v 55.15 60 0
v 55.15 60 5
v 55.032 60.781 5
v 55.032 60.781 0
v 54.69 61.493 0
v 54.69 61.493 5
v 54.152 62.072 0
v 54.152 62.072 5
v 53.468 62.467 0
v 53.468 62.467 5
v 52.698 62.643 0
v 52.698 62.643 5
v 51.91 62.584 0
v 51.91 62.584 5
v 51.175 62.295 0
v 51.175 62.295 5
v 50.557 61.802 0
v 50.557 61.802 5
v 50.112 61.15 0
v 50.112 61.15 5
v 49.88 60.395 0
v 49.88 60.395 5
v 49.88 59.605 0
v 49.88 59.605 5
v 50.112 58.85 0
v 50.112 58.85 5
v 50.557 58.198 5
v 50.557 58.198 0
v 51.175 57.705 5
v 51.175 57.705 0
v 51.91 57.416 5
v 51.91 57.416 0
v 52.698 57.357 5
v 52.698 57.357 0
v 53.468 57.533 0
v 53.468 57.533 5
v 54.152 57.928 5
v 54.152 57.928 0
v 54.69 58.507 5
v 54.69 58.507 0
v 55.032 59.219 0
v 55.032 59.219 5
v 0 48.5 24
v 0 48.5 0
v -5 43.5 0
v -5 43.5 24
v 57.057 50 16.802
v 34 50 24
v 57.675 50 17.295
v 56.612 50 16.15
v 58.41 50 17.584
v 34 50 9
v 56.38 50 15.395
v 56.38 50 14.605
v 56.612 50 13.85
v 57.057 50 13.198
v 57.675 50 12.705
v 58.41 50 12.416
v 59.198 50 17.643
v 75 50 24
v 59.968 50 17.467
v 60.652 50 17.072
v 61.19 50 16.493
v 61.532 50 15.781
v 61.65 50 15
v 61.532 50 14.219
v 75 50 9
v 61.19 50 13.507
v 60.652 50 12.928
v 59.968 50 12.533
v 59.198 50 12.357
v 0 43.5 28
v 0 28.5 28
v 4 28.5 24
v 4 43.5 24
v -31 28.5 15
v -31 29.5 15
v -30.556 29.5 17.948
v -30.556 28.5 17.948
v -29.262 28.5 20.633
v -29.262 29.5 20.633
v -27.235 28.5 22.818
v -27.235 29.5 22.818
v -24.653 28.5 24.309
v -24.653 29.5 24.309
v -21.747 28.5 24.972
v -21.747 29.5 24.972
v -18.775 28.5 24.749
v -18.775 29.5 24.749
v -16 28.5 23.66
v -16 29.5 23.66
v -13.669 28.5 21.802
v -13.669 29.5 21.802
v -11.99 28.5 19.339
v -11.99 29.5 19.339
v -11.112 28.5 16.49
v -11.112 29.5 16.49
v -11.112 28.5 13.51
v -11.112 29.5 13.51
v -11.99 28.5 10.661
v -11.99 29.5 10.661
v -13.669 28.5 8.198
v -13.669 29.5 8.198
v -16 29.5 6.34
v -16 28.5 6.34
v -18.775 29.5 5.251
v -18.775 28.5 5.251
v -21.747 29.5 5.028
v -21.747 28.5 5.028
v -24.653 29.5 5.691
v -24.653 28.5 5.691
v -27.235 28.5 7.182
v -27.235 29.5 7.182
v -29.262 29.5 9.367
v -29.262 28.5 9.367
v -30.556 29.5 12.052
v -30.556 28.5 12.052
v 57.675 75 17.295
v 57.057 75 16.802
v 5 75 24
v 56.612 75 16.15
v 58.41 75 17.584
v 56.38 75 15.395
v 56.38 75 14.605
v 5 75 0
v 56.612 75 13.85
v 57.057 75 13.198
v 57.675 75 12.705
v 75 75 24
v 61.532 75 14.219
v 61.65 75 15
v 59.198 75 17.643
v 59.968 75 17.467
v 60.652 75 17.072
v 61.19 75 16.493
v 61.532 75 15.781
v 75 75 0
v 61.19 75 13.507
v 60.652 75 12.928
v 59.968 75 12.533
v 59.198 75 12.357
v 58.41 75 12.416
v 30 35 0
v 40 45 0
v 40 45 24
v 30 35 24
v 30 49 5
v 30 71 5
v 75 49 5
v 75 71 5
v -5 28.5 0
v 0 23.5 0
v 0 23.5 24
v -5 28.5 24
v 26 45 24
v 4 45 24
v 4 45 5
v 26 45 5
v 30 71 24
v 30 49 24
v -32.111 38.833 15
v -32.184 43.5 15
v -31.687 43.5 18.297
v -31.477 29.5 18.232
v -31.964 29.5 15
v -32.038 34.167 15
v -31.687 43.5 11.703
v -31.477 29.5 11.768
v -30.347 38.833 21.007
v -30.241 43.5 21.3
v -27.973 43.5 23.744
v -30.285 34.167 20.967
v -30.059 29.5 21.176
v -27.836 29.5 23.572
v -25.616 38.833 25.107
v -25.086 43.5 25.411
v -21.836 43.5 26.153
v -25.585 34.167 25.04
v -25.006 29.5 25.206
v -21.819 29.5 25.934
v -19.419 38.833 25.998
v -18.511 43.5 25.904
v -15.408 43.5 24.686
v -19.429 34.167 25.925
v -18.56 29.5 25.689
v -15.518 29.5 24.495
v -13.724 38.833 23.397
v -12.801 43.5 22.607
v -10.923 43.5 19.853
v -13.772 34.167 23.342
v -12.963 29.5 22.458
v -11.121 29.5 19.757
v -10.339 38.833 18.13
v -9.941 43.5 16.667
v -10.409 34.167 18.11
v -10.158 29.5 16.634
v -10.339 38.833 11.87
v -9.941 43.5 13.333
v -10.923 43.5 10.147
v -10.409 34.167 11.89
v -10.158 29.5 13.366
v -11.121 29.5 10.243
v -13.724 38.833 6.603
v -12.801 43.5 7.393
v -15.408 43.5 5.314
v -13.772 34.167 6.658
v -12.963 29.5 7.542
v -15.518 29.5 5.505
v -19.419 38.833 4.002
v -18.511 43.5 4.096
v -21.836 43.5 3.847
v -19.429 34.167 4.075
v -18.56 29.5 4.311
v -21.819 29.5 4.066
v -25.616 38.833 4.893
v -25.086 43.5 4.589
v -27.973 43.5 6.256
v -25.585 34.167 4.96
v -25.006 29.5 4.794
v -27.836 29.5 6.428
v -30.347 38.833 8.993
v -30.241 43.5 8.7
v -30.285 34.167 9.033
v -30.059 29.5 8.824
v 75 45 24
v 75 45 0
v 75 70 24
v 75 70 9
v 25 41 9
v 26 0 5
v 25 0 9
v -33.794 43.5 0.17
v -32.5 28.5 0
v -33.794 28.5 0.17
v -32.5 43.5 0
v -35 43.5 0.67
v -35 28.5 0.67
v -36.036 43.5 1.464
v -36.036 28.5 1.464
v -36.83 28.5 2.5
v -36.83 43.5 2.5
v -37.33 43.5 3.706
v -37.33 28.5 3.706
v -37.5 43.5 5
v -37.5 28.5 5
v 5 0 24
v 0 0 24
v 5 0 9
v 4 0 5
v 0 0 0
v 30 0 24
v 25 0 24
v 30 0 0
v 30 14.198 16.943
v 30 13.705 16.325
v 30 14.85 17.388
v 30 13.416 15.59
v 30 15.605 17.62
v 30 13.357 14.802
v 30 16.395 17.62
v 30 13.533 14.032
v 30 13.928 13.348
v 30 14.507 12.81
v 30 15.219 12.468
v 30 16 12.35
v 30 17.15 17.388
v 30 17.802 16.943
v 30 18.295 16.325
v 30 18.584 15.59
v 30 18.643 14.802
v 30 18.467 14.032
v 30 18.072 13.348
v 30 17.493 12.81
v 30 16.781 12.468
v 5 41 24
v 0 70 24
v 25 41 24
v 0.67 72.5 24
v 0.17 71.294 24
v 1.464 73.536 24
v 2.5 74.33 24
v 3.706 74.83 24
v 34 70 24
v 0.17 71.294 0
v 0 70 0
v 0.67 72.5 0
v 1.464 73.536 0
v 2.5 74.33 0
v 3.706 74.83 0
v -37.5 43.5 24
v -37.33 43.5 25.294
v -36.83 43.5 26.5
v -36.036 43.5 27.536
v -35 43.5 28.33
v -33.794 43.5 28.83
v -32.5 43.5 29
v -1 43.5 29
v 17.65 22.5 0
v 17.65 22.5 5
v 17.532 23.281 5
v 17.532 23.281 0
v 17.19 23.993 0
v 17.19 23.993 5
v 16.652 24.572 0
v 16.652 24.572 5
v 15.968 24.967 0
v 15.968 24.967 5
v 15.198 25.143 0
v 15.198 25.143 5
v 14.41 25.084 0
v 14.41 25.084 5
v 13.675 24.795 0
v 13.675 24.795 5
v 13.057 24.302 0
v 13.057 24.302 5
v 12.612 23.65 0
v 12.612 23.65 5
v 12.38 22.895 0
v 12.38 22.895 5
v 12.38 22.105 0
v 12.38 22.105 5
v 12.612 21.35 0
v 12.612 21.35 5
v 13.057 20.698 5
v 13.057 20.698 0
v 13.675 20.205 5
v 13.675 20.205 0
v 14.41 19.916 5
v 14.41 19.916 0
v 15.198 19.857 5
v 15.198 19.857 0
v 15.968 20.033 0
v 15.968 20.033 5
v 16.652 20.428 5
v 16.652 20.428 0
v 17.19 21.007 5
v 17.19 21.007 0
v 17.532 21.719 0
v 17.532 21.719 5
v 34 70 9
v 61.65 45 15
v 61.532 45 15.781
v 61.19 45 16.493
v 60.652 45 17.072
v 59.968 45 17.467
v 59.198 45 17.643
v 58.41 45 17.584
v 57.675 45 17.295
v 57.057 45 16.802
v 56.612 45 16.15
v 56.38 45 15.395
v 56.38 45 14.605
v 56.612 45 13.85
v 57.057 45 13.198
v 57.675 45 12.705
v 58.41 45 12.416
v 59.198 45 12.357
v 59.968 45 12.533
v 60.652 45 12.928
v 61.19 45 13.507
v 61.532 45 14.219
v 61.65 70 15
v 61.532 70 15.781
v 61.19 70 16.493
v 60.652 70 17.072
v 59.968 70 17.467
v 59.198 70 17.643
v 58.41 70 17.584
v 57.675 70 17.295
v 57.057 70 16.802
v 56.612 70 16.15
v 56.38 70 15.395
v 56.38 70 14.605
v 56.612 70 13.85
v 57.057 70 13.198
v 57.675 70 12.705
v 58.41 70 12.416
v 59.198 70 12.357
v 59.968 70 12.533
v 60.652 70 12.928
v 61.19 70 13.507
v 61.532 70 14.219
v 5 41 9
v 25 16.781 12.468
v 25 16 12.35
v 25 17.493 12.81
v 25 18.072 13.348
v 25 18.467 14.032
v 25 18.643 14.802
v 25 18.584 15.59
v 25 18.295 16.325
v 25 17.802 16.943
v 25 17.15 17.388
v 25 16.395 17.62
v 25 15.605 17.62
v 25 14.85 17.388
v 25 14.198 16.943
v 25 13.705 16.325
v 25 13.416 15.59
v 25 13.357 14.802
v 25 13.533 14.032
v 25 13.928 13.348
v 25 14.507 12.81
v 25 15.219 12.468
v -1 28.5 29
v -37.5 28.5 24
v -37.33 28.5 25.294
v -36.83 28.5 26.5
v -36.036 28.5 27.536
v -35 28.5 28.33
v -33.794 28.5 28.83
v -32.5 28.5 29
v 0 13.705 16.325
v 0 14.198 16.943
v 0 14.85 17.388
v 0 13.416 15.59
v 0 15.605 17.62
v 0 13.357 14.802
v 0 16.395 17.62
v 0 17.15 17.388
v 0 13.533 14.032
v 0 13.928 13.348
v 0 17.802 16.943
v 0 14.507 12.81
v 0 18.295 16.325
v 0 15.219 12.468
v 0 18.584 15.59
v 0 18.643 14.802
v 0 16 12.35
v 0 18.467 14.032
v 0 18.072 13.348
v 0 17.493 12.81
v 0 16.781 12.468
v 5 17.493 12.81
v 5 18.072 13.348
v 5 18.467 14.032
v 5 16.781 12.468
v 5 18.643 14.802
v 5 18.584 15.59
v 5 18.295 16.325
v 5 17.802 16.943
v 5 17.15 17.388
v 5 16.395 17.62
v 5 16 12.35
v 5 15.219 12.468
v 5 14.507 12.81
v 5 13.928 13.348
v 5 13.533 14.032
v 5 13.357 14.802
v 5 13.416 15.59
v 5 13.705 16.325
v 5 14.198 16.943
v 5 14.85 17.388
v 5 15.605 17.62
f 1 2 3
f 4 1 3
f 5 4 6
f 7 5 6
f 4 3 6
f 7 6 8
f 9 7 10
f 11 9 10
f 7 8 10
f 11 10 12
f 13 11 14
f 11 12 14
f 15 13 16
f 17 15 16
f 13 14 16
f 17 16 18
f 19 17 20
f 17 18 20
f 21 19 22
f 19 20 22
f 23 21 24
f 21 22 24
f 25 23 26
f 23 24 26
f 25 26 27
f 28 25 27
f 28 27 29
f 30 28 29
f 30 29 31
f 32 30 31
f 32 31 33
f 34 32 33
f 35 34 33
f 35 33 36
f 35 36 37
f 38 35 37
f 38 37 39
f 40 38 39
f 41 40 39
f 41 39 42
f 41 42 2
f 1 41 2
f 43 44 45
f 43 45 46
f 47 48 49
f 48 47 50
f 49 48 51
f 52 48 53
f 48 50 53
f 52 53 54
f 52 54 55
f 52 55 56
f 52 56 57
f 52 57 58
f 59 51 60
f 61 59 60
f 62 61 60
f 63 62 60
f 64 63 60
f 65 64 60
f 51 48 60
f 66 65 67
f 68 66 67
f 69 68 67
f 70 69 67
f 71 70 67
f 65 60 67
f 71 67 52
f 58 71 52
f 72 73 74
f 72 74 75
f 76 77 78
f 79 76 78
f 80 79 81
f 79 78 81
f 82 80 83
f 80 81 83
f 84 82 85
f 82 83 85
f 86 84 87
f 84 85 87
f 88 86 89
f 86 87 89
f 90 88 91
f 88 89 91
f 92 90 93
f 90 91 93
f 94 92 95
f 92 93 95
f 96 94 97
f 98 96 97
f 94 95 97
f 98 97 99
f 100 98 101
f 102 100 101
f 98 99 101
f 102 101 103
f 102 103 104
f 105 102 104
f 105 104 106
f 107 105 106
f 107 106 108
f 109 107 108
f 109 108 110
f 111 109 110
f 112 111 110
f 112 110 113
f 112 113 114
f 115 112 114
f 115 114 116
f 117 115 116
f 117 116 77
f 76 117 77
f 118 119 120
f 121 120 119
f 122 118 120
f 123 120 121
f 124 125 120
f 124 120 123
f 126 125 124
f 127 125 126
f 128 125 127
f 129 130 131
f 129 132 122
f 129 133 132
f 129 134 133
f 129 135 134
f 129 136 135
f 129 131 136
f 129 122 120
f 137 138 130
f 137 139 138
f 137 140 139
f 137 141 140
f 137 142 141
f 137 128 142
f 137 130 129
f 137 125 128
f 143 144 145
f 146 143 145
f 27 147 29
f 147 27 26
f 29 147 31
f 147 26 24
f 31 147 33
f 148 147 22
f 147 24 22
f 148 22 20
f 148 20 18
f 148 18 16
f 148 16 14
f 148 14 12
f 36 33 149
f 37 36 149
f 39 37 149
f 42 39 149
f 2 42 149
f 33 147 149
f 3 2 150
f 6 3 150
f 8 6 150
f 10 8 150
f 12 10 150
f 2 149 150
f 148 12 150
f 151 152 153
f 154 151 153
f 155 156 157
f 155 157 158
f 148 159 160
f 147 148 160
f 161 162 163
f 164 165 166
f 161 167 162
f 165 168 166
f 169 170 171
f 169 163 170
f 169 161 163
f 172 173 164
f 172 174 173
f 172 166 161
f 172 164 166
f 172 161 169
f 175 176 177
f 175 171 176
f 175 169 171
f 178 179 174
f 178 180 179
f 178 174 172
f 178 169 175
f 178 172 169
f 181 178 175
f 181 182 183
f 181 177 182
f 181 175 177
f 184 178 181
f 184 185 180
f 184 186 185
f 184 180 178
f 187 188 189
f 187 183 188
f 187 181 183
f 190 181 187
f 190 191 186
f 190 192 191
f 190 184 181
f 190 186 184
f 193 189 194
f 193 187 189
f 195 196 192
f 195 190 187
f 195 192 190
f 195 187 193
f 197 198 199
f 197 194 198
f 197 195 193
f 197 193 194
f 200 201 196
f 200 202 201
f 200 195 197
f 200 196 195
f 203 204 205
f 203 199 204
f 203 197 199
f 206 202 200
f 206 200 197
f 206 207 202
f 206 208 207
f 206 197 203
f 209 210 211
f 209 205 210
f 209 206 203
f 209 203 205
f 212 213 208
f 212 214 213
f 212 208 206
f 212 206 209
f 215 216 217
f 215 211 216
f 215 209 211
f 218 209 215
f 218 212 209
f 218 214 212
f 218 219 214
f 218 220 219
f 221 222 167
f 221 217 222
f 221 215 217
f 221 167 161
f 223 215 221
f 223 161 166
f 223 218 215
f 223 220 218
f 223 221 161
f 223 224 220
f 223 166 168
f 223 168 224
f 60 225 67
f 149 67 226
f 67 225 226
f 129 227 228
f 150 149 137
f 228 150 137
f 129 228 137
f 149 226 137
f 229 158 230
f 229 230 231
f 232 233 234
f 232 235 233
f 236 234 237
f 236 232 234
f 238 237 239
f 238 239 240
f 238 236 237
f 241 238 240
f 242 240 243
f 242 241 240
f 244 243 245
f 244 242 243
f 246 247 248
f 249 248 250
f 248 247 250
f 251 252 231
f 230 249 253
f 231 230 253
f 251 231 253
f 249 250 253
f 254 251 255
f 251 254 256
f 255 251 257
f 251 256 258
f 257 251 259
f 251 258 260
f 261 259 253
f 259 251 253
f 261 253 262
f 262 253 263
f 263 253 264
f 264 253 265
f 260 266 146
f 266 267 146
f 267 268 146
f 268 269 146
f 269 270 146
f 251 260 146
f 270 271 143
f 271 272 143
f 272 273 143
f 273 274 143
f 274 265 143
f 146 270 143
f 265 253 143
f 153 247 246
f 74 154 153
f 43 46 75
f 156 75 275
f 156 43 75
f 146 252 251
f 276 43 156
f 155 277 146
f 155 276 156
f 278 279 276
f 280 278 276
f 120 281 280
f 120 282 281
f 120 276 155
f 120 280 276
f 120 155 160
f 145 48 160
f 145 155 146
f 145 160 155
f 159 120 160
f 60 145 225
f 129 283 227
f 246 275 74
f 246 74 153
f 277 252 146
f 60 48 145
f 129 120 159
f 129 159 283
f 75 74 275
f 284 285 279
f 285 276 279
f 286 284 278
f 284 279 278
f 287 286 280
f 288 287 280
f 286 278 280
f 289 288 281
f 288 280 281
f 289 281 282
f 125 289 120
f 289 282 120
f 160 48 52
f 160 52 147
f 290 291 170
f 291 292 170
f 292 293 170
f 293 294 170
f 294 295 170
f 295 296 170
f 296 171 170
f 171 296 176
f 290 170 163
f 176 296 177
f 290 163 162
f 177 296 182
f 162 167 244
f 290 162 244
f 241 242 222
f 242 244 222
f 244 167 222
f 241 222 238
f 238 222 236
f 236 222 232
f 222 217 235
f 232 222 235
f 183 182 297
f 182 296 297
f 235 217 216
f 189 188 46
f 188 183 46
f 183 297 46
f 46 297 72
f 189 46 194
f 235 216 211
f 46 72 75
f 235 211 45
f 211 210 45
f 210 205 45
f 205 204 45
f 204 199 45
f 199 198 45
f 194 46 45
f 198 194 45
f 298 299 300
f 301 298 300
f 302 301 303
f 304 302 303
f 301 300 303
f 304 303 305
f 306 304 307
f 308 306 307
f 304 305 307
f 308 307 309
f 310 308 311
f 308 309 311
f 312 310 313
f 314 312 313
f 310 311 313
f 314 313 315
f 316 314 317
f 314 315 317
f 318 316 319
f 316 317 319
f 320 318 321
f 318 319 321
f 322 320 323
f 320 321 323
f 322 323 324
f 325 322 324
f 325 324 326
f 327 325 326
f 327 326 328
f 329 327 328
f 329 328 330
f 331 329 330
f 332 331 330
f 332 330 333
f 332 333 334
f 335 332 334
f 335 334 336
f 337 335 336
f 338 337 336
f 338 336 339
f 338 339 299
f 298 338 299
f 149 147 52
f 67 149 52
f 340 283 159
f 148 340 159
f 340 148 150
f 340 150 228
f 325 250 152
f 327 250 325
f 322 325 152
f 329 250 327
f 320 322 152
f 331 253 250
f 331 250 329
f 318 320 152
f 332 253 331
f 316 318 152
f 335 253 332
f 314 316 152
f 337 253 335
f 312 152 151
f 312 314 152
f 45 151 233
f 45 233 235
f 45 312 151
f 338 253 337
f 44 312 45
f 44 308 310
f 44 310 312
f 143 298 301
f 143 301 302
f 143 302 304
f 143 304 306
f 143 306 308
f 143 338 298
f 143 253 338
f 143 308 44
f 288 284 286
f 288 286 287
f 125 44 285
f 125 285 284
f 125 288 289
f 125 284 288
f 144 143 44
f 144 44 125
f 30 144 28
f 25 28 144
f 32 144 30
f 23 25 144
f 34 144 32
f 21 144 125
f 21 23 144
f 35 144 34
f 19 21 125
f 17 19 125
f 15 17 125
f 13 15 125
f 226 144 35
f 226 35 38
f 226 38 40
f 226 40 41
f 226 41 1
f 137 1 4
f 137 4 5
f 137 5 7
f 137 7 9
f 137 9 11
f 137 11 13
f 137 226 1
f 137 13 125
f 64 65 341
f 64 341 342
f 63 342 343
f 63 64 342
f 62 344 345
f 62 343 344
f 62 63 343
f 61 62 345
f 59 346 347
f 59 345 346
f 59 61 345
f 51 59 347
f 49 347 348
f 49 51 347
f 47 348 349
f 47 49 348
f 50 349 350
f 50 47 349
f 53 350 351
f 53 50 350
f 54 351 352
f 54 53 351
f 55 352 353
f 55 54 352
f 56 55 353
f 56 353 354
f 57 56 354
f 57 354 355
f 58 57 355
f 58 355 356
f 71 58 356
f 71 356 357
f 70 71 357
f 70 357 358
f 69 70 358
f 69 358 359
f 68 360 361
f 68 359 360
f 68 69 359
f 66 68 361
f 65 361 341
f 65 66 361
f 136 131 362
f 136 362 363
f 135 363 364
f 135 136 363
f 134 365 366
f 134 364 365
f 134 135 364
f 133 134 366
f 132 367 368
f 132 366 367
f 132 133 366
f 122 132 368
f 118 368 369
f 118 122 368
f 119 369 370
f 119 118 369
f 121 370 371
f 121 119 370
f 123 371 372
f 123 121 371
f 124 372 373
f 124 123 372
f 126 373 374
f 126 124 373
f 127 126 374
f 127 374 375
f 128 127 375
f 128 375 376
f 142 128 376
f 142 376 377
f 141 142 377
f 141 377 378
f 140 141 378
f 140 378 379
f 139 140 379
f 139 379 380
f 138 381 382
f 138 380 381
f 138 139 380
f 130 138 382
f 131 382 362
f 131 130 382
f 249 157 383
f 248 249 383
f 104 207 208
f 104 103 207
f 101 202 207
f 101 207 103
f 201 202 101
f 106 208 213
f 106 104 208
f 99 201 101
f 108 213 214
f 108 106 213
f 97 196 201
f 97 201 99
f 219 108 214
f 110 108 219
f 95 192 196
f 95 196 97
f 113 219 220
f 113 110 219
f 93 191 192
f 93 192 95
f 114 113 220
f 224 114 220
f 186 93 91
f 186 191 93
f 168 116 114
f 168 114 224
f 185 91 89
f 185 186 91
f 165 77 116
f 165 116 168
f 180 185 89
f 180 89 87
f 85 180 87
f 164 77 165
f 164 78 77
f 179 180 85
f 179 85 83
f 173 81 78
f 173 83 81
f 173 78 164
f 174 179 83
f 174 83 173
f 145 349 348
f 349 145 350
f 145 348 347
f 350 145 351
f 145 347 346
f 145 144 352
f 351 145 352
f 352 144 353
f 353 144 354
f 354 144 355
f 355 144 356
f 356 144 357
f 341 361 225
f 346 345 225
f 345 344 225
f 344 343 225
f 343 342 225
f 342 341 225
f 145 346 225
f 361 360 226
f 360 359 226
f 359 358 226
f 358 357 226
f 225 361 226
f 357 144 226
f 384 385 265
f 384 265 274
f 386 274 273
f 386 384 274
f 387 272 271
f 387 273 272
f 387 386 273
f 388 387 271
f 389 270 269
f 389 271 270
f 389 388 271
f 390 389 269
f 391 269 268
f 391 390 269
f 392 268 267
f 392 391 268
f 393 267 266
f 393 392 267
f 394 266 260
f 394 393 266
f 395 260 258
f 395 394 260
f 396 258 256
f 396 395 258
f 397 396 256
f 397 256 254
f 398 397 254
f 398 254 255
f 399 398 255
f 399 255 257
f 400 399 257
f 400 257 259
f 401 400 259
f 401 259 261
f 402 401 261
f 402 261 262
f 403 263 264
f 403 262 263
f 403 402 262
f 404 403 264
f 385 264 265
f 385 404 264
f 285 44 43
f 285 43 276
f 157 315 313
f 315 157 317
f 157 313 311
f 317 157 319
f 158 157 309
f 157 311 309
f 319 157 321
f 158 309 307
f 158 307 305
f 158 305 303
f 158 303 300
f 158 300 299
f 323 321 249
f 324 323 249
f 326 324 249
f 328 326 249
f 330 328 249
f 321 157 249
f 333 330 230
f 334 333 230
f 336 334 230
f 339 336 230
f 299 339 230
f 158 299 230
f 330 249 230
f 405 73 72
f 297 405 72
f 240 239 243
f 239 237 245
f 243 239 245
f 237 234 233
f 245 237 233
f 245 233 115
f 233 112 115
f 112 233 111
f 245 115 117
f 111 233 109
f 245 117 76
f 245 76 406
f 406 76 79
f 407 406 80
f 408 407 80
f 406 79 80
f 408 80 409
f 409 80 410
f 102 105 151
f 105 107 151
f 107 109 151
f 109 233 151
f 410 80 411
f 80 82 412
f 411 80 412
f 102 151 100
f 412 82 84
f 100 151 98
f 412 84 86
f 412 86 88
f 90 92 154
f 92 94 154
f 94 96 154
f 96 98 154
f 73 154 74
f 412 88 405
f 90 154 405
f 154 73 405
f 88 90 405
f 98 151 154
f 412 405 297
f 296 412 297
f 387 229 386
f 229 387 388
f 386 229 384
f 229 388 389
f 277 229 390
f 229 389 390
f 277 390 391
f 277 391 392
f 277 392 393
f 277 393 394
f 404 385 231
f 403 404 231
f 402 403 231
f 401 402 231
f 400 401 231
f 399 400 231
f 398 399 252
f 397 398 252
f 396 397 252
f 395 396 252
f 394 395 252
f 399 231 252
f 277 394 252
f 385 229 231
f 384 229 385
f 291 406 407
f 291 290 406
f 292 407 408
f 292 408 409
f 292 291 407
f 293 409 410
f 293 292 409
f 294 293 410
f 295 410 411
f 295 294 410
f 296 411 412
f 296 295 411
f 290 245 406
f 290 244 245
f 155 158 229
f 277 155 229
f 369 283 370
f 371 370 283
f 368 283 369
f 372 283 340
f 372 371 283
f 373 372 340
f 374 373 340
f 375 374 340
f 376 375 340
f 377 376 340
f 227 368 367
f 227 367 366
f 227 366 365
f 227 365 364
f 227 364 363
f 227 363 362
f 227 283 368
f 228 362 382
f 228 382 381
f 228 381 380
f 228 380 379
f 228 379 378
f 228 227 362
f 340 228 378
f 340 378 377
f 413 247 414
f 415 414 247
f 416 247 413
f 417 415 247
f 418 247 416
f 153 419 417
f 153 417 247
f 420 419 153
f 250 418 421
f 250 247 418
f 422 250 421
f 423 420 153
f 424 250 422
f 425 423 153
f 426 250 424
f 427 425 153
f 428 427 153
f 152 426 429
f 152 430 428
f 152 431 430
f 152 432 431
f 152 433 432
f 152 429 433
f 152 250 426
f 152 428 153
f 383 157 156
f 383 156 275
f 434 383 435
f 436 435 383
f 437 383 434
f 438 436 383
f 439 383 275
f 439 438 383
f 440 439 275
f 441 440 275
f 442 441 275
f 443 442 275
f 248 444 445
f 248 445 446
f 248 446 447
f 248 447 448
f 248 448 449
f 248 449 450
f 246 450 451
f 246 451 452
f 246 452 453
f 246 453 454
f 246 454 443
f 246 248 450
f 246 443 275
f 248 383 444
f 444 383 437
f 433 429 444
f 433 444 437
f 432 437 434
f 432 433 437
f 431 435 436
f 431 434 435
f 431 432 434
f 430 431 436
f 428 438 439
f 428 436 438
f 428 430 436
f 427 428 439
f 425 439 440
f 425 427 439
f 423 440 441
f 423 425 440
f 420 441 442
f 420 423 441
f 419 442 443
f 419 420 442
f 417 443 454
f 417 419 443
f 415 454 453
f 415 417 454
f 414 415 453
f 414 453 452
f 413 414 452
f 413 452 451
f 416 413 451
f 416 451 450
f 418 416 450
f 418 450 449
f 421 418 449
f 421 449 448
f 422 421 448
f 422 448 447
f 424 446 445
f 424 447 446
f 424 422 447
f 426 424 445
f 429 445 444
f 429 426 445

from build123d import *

# Parameters (mm, degrees)
SKETCH1_W               = 75
SKETCH1_H               = 75
BOSS_EXTRUDE1_DEPTH     = 24
SKETCH2_W               = 20
SKETCH2_H               = 19
CUT_EXTRUDE1_DEPTH      = 45
SKETCH3_W               = 19
SKETCH3_H               = 20
CUT_EXTRUDE2_DEPTH      = 45
CUT_EXTRUDE3_DEPTH      = 109.747413762
CUT_EXTRUDE3_DEPTH_BACK = 109.747413762
SKETCH4_W               = 45
SKETCH4_H               = 45
FILLET1_R               = 5
CHAMFER1_SIZE           = 10
SKETCH5_W               = 29
SKETCH5_H               = 15
BOSS_EXTRUDE2_DEPTH     = 37.5
SKETCH6_R               = 11.2
CUT_EXTRUDE4_DEPTH      = 14
FILLET2_R               = 5
CHAMFER3_SIZE           = 5
CUT_EXTRUDE5_DEPTH      = 93.146622293
CUT_EXTRUDE5_DEPTH_BACK = 93.146622293
SKETCH7_R               = 2.65
CUT_EXTRUDE6_DEPTH      = 105.986903945
CUT_EXTRUDE6_DEPTH_BACK = 105.986903945
SKETCH8_R               = 2.65
SKETCH9_R               = 2.65
CUT_EXTRUDE7_DEPTH      = 10
SKETCH10_R              = 2.65
CUT_EXTRUDE8_DEPTH      = 10
CUT_EXTRUDE12_DEPTH     = 19
CUT_EXTRUDE13_REACH     = 111.959
CUT_EXTRUDE14_REACH     = 140.283
SKETCH14_R              = 10
CUT_EXTRUDE15_DEPTH     = 10
CHAMFER5_SIZE           = 4
CHAMFER6_SIZE           = 1
CHAMFER8_SIZE           = 15
CHAMFER8_SIZE_2         = 0.23563883


# Some blends are built 0.0001 mm under size
with BuildPart() as part:
    # Sketch1 → Boss-Extrude1 (new body)
    with BuildSketch(Plane.XY):
        with Locations((37.5, 37.5)):
            Rectangle(SKETCH1_W, SKETCH1_H)
    extrude(amount=BOSS_EXTRUDE1_DEPTH)

    # Sketch2 → Cut-Extrude1 (cut)
    with BuildSketch(Plane.XZ):
        with Locations((15, 14.5)):
            Rectangle(SKETCH2_W, SKETCH2_H)
    extrude(amount=-CUT_EXTRUDE1_DEPTH, mode=Mode.SUBTRACT)

    # Sketch3 → Cut-Extrude2 (cut)
    with BuildSketch(Plane(origin=(75, 0, 0), x_dir=(0, 0, -1), z_dir=(1, 0, 0))):
        with Locations((-14.5, 60)):
            Rectangle(SKETCH3_W, SKETCH3_H)
    extrude(amount=-CUT_EXTRUDE2_DEPTH, mode=Mode.SUBTRACT)

    # Sketch4 → Cut-Extrude3 (cut, two sides: drawn at the far end of the back side and taken through both)
    with BuildSketch(Plane.XY.offset(24).offset(-CUT_EXTRUDE3_DEPTH_BACK)):
        with Locations((52.5, 22.5)):
            Rectangle(SKETCH4_W, SKETCH4_H)
    extrude(amount=CUT_EXTRUDE3_DEPTH + CUT_EXTRUDE3_DEPTH_BACK, mode=Mode.SUBTRACT)

    # Fillet1
    fillet1_edges = [part.edges().sort_by_distance(p)[0] for p in [
        (0, 75, 12),
    ]]
    fillet(fillet1_edges, radius=FILLET1_R)

    # Chamfer1
    chamfer1_edges = [part.edges().sort_by_distance(p)[0] for p in [
        (30, 45, 12),
    ]]
    chamfer(chamfer1_edges, length=CHAMFER1_SIZE)

    # Sketch5 → Boss-Extrude2 (add)
    with BuildSketch(Plane.ZY):
        with Locations((14.5, 36)):
            Rectangle(SKETCH5_W, SKETCH5_H)
    extrude(amount=BOSS_EXTRUDE2_DEPTH)

    # Sketch6 → Cut-Extrude4 (cut)
    with BuildSketch(Plane(origin=(0, 43.5, 0), x_dir=(1, 0, 0), z_dir=(0, 1, 0))):
        with Locations(Location((-21, -15.000000001, 0), (0, 0, 180))):
            Circle(SKETCH6_R)
    extrude(amount=-CUT_EXTRUDE4_DEPTH, mode=Mode.SUBTRACT)

    # Fillet2
    fillet2_edges = [part.edges().sort_by_distance(p)[0] for p in [
        (-37.5, 36, 29),
        (-37.5, 36, 0),
    ]]
    fillet(fillet2_edges, radius=FILLET2_R)

    # Chamfer3
    chamfer3_edges = [part.edges().sort_by_distance(p)[0] for p in [
        (0, 43.5, 12),
        (0, 28.5, 12),
    ]]
    chamfer(chamfer3_edges, length=CHAMFER3_SIZE)

    # Sketch7 → Cut-Extrude5 (cut, two sides: drawn at the far end of the back side and taken through both)
    with BuildSketch(Plane.XZ.offset(-45).offset(-CUT_EXTRUDE5_DEPTH_BACK)):
        with Locations((59, 15)):
            Circle(SKETCH7_R)
    extrude(amount=CUT_EXTRUDE5_DEPTH + CUT_EXTRUDE5_DEPTH_BACK, mode=Mode.SUBTRACT)

    # Sketch8 → Cut-Extrude6 (cut, two sides: drawn at the far end of the back side and taken through both)
    with BuildSketch(Plane(origin=(30, 0, 0), x_dir=(0, 0, -1), z_dir=(1, 0, 0)).offset(-CUT_EXTRUDE6_DEPTH_BACK)):
        with Locations((-15, 16)):
            Circle(SKETCH8_R)
    extrude(amount=CUT_EXTRUDE6_DEPTH + CUT_EXTRUDE6_DEPTH_BACK, mode=Mode.SUBTRACT)

    # Sketch9 → Cut-Extrude7 (cut)
    with BuildSketch(Plane.XY.offset(5)):
        with Locations((15, 22.5)):
            Circle(SKETCH9_R)
    extrude(amount=-CUT_EXTRUDE7_DEPTH, mode=Mode.SUBTRACT)

    # Sketch10 → Cut-Extrude8 (cut)
    with BuildSketch(Plane.XY.offset(5)):
        with Locations((52.5, 60)):
            Circle(SKETCH10_R)
    extrude(amount=-CUT_EXTRUDE8_DEPTH, mode=Mode.SUBTRACT)

    # Sketch11 → Cut-Extrude12 (cut)
    with BuildSketch(Plane.XY.offset(24)):
        Polygon((34, 70), (30, 71), (30, 70), align=None)
        Polygon((30, 50), (34, 50), (30, 49), align=None)
        Polygon((26, 45), (25, 41), (25, 45), align=None)
        Polygon((5, 45), (4, 45), (5, 41), align=None)
    extrude(amount=-CUT_EXTRUDE12_DEPTH, mode=Mode.SUBTRACT)

    # Cut-Extrude13: up to this face of the body (flat: up to its plane)
    cut_extrude13_end = Plane(part.part.faces().sort_by_distance((15, 45, 14.5))[0])
    # Sketch12 → Cut-Extrude13 (cut, up to the picked face)
    with BuildSketch(Plane.XZ, mode=Mode.PRIVATE) as cut_extrude13_sk1:
        Polygon((5, 5), (4, 5), (5, 9), align=None)
    cut_extrude13_tool1 = split(extrude(cut_extrude13_sk1.sketch, amount=-CUT_EXTRUDE13_REACH, mode=Mode.PRIVATE), bisect_by=cut_extrude13_end, keep=Keep.BOTH, mode=Mode.PRIVATE)
    # Sketch12 → Cut-Extrude13 (cut, up to the picked face)
    with BuildSketch(Plane.XZ, mode=Mode.PRIVATE) as cut_extrude13_sk2:
        Polygon((25, 5), (26, 5), (25, 9), align=None)
    cut_extrude13_tool2 = split(extrude(cut_extrude13_sk2.sketch, amount=-CUT_EXTRUDE13_REACH, mode=Mode.PRIVATE), bisect_by=cut_extrude13_end, keep=Keep.BOTH, mode=Mode.PRIVATE)
    add(cut_extrude13_tool1.solids().sort_by(Axis((4.666667, 0, 6.333333), (0, 1, 0)))[0], mode=Mode.SUBTRACT)
    add(cut_extrude13_tool2.solids().sort_by(Axis((25.333333, 0, 6.333333), (0, 1, 0)))[0], mode=Mode.SUBTRACT)

    # Cut-Extrude14: up to this face of the body (flat: up to its plane)
    cut_extrude14_end = Plane(part.part.faces().sort_by_distance((30, 60, 14.5))[0])
    # Sketch13 → Cut-Extrude14 (cut, up to the picked face)
    with BuildSketch(Plane(origin=(75, 0, 0), x_dir=(0, 0, -1), z_dir=(1, 0, 0)), mode=Mode.PRIVATE) as cut_extrude14_sk1:
        Polygon((-5, 50), (-5, 49), (-9, 50), align=None)
    cut_extrude14_tool1 = split(extrude(cut_extrude14_sk1.sketch, amount=-CUT_EXTRUDE14_REACH, mode=Mode.PRIVATE), bisect_by=cut_extrude14_end, keep=Keep.BOTH, mode=Mode.PRIVATE)
    # Sketch13 → Cut-Extrude14 (cut, up to the picked face)
    with BuildSketch(Plane(origin=(75, 0, 0), x_dir=(0, 0, -1), z_dir=(1, 0, 0)), mode=Mode.PRIVATE) as cut_extrude14_sk2:
        Polygon((-5, 70), (-5, 71), (-9, 70), align=None)
    cut_extrude14_tool2 = split(extrude(cut_extrude14_sk2.sketch, amount=-CUT_EXTRUDE14_REACH, mode=Mode.PRIVATE), bisect_by=cut_extrude14_end, keep=Keep.BOTH, mode=Mode.PRIVATE)
    add(cut_extrude14_tool1.solids().sort_by(Axis((75, 49.666667, 6.333333), (-1, 0, 0)))[0], mode=Mode.SUBTRACT)
    add(cut_extrude14_tool2.solids().sort_by(Axis((75, 70.333333, 6.333333), (-1, 0, 0)))[0], mode=Mode.SUBTRACT)

    # Sketch14 → Cut-Extrude15 (cut)
    with BuildSketch(Plane(origin=(0, 29.5, 0), x_dir=(1, 0, 0), z_dir=(0, 1, 0))):
        with Locations(Location((-21, -15.000000001, 0), (0, 0, 180))):
            Circle(SKETCH14_R)
    extrude(amount=-CUT_EXTRUDE15_DEPTH, mode=Mode.SUBTRACT)

    # Chamfer5
    chamfer5_edges = [part.edges().sort_by_distance(p)[0] for p in [
        (0, 36, 24),
    ]]
    chamfer(chamfer5_edges, length=CHAMFER5_SIZE)

    # Chamfer6
    chamfer6_edges = [part.edges().sort_by_distance(p)[0] for p in [
        (0, 36, 29),
    ]]
    chamfer(chamfer6_edges, length=CHAMFER6_SIZE - 0.0001)  # a hair under: the kernel refuses the full size

    # Chamfer8
    # the kernel refuses this chamfer: 15, 0.23563883 mm, written as the material it adds along each edge
    with BuildSketch(Plane(origin=(-21, 29.5, 15.000000001), x_dir=(-1, 0, 0), z_dir=(0, 0, -1))) as chamfer8_piece_1_section:
        Polygon((11.2, CHAMFER8_SIZE), (11.2 - CHAMFER8_SIZE_2, 0), (11.2, 0), align=None)
    chamfer8_piece_1 = revolve(axis=Axis((-21, 29.5, 15.000000001), (0, 1, 0)), mode=Mode.PRIVATE)
    chamfer8_piece_1 = split(chamfer8_piece_1, bisect_by=Plane(origin=(-9.855053723, 43.5, 15.000000001), z_dir=(0, -1, 0)), keep=Keep.TOP, mode=Mode.PRIVATE)
    add(chamfer8_piece_1)


solid = part.part
